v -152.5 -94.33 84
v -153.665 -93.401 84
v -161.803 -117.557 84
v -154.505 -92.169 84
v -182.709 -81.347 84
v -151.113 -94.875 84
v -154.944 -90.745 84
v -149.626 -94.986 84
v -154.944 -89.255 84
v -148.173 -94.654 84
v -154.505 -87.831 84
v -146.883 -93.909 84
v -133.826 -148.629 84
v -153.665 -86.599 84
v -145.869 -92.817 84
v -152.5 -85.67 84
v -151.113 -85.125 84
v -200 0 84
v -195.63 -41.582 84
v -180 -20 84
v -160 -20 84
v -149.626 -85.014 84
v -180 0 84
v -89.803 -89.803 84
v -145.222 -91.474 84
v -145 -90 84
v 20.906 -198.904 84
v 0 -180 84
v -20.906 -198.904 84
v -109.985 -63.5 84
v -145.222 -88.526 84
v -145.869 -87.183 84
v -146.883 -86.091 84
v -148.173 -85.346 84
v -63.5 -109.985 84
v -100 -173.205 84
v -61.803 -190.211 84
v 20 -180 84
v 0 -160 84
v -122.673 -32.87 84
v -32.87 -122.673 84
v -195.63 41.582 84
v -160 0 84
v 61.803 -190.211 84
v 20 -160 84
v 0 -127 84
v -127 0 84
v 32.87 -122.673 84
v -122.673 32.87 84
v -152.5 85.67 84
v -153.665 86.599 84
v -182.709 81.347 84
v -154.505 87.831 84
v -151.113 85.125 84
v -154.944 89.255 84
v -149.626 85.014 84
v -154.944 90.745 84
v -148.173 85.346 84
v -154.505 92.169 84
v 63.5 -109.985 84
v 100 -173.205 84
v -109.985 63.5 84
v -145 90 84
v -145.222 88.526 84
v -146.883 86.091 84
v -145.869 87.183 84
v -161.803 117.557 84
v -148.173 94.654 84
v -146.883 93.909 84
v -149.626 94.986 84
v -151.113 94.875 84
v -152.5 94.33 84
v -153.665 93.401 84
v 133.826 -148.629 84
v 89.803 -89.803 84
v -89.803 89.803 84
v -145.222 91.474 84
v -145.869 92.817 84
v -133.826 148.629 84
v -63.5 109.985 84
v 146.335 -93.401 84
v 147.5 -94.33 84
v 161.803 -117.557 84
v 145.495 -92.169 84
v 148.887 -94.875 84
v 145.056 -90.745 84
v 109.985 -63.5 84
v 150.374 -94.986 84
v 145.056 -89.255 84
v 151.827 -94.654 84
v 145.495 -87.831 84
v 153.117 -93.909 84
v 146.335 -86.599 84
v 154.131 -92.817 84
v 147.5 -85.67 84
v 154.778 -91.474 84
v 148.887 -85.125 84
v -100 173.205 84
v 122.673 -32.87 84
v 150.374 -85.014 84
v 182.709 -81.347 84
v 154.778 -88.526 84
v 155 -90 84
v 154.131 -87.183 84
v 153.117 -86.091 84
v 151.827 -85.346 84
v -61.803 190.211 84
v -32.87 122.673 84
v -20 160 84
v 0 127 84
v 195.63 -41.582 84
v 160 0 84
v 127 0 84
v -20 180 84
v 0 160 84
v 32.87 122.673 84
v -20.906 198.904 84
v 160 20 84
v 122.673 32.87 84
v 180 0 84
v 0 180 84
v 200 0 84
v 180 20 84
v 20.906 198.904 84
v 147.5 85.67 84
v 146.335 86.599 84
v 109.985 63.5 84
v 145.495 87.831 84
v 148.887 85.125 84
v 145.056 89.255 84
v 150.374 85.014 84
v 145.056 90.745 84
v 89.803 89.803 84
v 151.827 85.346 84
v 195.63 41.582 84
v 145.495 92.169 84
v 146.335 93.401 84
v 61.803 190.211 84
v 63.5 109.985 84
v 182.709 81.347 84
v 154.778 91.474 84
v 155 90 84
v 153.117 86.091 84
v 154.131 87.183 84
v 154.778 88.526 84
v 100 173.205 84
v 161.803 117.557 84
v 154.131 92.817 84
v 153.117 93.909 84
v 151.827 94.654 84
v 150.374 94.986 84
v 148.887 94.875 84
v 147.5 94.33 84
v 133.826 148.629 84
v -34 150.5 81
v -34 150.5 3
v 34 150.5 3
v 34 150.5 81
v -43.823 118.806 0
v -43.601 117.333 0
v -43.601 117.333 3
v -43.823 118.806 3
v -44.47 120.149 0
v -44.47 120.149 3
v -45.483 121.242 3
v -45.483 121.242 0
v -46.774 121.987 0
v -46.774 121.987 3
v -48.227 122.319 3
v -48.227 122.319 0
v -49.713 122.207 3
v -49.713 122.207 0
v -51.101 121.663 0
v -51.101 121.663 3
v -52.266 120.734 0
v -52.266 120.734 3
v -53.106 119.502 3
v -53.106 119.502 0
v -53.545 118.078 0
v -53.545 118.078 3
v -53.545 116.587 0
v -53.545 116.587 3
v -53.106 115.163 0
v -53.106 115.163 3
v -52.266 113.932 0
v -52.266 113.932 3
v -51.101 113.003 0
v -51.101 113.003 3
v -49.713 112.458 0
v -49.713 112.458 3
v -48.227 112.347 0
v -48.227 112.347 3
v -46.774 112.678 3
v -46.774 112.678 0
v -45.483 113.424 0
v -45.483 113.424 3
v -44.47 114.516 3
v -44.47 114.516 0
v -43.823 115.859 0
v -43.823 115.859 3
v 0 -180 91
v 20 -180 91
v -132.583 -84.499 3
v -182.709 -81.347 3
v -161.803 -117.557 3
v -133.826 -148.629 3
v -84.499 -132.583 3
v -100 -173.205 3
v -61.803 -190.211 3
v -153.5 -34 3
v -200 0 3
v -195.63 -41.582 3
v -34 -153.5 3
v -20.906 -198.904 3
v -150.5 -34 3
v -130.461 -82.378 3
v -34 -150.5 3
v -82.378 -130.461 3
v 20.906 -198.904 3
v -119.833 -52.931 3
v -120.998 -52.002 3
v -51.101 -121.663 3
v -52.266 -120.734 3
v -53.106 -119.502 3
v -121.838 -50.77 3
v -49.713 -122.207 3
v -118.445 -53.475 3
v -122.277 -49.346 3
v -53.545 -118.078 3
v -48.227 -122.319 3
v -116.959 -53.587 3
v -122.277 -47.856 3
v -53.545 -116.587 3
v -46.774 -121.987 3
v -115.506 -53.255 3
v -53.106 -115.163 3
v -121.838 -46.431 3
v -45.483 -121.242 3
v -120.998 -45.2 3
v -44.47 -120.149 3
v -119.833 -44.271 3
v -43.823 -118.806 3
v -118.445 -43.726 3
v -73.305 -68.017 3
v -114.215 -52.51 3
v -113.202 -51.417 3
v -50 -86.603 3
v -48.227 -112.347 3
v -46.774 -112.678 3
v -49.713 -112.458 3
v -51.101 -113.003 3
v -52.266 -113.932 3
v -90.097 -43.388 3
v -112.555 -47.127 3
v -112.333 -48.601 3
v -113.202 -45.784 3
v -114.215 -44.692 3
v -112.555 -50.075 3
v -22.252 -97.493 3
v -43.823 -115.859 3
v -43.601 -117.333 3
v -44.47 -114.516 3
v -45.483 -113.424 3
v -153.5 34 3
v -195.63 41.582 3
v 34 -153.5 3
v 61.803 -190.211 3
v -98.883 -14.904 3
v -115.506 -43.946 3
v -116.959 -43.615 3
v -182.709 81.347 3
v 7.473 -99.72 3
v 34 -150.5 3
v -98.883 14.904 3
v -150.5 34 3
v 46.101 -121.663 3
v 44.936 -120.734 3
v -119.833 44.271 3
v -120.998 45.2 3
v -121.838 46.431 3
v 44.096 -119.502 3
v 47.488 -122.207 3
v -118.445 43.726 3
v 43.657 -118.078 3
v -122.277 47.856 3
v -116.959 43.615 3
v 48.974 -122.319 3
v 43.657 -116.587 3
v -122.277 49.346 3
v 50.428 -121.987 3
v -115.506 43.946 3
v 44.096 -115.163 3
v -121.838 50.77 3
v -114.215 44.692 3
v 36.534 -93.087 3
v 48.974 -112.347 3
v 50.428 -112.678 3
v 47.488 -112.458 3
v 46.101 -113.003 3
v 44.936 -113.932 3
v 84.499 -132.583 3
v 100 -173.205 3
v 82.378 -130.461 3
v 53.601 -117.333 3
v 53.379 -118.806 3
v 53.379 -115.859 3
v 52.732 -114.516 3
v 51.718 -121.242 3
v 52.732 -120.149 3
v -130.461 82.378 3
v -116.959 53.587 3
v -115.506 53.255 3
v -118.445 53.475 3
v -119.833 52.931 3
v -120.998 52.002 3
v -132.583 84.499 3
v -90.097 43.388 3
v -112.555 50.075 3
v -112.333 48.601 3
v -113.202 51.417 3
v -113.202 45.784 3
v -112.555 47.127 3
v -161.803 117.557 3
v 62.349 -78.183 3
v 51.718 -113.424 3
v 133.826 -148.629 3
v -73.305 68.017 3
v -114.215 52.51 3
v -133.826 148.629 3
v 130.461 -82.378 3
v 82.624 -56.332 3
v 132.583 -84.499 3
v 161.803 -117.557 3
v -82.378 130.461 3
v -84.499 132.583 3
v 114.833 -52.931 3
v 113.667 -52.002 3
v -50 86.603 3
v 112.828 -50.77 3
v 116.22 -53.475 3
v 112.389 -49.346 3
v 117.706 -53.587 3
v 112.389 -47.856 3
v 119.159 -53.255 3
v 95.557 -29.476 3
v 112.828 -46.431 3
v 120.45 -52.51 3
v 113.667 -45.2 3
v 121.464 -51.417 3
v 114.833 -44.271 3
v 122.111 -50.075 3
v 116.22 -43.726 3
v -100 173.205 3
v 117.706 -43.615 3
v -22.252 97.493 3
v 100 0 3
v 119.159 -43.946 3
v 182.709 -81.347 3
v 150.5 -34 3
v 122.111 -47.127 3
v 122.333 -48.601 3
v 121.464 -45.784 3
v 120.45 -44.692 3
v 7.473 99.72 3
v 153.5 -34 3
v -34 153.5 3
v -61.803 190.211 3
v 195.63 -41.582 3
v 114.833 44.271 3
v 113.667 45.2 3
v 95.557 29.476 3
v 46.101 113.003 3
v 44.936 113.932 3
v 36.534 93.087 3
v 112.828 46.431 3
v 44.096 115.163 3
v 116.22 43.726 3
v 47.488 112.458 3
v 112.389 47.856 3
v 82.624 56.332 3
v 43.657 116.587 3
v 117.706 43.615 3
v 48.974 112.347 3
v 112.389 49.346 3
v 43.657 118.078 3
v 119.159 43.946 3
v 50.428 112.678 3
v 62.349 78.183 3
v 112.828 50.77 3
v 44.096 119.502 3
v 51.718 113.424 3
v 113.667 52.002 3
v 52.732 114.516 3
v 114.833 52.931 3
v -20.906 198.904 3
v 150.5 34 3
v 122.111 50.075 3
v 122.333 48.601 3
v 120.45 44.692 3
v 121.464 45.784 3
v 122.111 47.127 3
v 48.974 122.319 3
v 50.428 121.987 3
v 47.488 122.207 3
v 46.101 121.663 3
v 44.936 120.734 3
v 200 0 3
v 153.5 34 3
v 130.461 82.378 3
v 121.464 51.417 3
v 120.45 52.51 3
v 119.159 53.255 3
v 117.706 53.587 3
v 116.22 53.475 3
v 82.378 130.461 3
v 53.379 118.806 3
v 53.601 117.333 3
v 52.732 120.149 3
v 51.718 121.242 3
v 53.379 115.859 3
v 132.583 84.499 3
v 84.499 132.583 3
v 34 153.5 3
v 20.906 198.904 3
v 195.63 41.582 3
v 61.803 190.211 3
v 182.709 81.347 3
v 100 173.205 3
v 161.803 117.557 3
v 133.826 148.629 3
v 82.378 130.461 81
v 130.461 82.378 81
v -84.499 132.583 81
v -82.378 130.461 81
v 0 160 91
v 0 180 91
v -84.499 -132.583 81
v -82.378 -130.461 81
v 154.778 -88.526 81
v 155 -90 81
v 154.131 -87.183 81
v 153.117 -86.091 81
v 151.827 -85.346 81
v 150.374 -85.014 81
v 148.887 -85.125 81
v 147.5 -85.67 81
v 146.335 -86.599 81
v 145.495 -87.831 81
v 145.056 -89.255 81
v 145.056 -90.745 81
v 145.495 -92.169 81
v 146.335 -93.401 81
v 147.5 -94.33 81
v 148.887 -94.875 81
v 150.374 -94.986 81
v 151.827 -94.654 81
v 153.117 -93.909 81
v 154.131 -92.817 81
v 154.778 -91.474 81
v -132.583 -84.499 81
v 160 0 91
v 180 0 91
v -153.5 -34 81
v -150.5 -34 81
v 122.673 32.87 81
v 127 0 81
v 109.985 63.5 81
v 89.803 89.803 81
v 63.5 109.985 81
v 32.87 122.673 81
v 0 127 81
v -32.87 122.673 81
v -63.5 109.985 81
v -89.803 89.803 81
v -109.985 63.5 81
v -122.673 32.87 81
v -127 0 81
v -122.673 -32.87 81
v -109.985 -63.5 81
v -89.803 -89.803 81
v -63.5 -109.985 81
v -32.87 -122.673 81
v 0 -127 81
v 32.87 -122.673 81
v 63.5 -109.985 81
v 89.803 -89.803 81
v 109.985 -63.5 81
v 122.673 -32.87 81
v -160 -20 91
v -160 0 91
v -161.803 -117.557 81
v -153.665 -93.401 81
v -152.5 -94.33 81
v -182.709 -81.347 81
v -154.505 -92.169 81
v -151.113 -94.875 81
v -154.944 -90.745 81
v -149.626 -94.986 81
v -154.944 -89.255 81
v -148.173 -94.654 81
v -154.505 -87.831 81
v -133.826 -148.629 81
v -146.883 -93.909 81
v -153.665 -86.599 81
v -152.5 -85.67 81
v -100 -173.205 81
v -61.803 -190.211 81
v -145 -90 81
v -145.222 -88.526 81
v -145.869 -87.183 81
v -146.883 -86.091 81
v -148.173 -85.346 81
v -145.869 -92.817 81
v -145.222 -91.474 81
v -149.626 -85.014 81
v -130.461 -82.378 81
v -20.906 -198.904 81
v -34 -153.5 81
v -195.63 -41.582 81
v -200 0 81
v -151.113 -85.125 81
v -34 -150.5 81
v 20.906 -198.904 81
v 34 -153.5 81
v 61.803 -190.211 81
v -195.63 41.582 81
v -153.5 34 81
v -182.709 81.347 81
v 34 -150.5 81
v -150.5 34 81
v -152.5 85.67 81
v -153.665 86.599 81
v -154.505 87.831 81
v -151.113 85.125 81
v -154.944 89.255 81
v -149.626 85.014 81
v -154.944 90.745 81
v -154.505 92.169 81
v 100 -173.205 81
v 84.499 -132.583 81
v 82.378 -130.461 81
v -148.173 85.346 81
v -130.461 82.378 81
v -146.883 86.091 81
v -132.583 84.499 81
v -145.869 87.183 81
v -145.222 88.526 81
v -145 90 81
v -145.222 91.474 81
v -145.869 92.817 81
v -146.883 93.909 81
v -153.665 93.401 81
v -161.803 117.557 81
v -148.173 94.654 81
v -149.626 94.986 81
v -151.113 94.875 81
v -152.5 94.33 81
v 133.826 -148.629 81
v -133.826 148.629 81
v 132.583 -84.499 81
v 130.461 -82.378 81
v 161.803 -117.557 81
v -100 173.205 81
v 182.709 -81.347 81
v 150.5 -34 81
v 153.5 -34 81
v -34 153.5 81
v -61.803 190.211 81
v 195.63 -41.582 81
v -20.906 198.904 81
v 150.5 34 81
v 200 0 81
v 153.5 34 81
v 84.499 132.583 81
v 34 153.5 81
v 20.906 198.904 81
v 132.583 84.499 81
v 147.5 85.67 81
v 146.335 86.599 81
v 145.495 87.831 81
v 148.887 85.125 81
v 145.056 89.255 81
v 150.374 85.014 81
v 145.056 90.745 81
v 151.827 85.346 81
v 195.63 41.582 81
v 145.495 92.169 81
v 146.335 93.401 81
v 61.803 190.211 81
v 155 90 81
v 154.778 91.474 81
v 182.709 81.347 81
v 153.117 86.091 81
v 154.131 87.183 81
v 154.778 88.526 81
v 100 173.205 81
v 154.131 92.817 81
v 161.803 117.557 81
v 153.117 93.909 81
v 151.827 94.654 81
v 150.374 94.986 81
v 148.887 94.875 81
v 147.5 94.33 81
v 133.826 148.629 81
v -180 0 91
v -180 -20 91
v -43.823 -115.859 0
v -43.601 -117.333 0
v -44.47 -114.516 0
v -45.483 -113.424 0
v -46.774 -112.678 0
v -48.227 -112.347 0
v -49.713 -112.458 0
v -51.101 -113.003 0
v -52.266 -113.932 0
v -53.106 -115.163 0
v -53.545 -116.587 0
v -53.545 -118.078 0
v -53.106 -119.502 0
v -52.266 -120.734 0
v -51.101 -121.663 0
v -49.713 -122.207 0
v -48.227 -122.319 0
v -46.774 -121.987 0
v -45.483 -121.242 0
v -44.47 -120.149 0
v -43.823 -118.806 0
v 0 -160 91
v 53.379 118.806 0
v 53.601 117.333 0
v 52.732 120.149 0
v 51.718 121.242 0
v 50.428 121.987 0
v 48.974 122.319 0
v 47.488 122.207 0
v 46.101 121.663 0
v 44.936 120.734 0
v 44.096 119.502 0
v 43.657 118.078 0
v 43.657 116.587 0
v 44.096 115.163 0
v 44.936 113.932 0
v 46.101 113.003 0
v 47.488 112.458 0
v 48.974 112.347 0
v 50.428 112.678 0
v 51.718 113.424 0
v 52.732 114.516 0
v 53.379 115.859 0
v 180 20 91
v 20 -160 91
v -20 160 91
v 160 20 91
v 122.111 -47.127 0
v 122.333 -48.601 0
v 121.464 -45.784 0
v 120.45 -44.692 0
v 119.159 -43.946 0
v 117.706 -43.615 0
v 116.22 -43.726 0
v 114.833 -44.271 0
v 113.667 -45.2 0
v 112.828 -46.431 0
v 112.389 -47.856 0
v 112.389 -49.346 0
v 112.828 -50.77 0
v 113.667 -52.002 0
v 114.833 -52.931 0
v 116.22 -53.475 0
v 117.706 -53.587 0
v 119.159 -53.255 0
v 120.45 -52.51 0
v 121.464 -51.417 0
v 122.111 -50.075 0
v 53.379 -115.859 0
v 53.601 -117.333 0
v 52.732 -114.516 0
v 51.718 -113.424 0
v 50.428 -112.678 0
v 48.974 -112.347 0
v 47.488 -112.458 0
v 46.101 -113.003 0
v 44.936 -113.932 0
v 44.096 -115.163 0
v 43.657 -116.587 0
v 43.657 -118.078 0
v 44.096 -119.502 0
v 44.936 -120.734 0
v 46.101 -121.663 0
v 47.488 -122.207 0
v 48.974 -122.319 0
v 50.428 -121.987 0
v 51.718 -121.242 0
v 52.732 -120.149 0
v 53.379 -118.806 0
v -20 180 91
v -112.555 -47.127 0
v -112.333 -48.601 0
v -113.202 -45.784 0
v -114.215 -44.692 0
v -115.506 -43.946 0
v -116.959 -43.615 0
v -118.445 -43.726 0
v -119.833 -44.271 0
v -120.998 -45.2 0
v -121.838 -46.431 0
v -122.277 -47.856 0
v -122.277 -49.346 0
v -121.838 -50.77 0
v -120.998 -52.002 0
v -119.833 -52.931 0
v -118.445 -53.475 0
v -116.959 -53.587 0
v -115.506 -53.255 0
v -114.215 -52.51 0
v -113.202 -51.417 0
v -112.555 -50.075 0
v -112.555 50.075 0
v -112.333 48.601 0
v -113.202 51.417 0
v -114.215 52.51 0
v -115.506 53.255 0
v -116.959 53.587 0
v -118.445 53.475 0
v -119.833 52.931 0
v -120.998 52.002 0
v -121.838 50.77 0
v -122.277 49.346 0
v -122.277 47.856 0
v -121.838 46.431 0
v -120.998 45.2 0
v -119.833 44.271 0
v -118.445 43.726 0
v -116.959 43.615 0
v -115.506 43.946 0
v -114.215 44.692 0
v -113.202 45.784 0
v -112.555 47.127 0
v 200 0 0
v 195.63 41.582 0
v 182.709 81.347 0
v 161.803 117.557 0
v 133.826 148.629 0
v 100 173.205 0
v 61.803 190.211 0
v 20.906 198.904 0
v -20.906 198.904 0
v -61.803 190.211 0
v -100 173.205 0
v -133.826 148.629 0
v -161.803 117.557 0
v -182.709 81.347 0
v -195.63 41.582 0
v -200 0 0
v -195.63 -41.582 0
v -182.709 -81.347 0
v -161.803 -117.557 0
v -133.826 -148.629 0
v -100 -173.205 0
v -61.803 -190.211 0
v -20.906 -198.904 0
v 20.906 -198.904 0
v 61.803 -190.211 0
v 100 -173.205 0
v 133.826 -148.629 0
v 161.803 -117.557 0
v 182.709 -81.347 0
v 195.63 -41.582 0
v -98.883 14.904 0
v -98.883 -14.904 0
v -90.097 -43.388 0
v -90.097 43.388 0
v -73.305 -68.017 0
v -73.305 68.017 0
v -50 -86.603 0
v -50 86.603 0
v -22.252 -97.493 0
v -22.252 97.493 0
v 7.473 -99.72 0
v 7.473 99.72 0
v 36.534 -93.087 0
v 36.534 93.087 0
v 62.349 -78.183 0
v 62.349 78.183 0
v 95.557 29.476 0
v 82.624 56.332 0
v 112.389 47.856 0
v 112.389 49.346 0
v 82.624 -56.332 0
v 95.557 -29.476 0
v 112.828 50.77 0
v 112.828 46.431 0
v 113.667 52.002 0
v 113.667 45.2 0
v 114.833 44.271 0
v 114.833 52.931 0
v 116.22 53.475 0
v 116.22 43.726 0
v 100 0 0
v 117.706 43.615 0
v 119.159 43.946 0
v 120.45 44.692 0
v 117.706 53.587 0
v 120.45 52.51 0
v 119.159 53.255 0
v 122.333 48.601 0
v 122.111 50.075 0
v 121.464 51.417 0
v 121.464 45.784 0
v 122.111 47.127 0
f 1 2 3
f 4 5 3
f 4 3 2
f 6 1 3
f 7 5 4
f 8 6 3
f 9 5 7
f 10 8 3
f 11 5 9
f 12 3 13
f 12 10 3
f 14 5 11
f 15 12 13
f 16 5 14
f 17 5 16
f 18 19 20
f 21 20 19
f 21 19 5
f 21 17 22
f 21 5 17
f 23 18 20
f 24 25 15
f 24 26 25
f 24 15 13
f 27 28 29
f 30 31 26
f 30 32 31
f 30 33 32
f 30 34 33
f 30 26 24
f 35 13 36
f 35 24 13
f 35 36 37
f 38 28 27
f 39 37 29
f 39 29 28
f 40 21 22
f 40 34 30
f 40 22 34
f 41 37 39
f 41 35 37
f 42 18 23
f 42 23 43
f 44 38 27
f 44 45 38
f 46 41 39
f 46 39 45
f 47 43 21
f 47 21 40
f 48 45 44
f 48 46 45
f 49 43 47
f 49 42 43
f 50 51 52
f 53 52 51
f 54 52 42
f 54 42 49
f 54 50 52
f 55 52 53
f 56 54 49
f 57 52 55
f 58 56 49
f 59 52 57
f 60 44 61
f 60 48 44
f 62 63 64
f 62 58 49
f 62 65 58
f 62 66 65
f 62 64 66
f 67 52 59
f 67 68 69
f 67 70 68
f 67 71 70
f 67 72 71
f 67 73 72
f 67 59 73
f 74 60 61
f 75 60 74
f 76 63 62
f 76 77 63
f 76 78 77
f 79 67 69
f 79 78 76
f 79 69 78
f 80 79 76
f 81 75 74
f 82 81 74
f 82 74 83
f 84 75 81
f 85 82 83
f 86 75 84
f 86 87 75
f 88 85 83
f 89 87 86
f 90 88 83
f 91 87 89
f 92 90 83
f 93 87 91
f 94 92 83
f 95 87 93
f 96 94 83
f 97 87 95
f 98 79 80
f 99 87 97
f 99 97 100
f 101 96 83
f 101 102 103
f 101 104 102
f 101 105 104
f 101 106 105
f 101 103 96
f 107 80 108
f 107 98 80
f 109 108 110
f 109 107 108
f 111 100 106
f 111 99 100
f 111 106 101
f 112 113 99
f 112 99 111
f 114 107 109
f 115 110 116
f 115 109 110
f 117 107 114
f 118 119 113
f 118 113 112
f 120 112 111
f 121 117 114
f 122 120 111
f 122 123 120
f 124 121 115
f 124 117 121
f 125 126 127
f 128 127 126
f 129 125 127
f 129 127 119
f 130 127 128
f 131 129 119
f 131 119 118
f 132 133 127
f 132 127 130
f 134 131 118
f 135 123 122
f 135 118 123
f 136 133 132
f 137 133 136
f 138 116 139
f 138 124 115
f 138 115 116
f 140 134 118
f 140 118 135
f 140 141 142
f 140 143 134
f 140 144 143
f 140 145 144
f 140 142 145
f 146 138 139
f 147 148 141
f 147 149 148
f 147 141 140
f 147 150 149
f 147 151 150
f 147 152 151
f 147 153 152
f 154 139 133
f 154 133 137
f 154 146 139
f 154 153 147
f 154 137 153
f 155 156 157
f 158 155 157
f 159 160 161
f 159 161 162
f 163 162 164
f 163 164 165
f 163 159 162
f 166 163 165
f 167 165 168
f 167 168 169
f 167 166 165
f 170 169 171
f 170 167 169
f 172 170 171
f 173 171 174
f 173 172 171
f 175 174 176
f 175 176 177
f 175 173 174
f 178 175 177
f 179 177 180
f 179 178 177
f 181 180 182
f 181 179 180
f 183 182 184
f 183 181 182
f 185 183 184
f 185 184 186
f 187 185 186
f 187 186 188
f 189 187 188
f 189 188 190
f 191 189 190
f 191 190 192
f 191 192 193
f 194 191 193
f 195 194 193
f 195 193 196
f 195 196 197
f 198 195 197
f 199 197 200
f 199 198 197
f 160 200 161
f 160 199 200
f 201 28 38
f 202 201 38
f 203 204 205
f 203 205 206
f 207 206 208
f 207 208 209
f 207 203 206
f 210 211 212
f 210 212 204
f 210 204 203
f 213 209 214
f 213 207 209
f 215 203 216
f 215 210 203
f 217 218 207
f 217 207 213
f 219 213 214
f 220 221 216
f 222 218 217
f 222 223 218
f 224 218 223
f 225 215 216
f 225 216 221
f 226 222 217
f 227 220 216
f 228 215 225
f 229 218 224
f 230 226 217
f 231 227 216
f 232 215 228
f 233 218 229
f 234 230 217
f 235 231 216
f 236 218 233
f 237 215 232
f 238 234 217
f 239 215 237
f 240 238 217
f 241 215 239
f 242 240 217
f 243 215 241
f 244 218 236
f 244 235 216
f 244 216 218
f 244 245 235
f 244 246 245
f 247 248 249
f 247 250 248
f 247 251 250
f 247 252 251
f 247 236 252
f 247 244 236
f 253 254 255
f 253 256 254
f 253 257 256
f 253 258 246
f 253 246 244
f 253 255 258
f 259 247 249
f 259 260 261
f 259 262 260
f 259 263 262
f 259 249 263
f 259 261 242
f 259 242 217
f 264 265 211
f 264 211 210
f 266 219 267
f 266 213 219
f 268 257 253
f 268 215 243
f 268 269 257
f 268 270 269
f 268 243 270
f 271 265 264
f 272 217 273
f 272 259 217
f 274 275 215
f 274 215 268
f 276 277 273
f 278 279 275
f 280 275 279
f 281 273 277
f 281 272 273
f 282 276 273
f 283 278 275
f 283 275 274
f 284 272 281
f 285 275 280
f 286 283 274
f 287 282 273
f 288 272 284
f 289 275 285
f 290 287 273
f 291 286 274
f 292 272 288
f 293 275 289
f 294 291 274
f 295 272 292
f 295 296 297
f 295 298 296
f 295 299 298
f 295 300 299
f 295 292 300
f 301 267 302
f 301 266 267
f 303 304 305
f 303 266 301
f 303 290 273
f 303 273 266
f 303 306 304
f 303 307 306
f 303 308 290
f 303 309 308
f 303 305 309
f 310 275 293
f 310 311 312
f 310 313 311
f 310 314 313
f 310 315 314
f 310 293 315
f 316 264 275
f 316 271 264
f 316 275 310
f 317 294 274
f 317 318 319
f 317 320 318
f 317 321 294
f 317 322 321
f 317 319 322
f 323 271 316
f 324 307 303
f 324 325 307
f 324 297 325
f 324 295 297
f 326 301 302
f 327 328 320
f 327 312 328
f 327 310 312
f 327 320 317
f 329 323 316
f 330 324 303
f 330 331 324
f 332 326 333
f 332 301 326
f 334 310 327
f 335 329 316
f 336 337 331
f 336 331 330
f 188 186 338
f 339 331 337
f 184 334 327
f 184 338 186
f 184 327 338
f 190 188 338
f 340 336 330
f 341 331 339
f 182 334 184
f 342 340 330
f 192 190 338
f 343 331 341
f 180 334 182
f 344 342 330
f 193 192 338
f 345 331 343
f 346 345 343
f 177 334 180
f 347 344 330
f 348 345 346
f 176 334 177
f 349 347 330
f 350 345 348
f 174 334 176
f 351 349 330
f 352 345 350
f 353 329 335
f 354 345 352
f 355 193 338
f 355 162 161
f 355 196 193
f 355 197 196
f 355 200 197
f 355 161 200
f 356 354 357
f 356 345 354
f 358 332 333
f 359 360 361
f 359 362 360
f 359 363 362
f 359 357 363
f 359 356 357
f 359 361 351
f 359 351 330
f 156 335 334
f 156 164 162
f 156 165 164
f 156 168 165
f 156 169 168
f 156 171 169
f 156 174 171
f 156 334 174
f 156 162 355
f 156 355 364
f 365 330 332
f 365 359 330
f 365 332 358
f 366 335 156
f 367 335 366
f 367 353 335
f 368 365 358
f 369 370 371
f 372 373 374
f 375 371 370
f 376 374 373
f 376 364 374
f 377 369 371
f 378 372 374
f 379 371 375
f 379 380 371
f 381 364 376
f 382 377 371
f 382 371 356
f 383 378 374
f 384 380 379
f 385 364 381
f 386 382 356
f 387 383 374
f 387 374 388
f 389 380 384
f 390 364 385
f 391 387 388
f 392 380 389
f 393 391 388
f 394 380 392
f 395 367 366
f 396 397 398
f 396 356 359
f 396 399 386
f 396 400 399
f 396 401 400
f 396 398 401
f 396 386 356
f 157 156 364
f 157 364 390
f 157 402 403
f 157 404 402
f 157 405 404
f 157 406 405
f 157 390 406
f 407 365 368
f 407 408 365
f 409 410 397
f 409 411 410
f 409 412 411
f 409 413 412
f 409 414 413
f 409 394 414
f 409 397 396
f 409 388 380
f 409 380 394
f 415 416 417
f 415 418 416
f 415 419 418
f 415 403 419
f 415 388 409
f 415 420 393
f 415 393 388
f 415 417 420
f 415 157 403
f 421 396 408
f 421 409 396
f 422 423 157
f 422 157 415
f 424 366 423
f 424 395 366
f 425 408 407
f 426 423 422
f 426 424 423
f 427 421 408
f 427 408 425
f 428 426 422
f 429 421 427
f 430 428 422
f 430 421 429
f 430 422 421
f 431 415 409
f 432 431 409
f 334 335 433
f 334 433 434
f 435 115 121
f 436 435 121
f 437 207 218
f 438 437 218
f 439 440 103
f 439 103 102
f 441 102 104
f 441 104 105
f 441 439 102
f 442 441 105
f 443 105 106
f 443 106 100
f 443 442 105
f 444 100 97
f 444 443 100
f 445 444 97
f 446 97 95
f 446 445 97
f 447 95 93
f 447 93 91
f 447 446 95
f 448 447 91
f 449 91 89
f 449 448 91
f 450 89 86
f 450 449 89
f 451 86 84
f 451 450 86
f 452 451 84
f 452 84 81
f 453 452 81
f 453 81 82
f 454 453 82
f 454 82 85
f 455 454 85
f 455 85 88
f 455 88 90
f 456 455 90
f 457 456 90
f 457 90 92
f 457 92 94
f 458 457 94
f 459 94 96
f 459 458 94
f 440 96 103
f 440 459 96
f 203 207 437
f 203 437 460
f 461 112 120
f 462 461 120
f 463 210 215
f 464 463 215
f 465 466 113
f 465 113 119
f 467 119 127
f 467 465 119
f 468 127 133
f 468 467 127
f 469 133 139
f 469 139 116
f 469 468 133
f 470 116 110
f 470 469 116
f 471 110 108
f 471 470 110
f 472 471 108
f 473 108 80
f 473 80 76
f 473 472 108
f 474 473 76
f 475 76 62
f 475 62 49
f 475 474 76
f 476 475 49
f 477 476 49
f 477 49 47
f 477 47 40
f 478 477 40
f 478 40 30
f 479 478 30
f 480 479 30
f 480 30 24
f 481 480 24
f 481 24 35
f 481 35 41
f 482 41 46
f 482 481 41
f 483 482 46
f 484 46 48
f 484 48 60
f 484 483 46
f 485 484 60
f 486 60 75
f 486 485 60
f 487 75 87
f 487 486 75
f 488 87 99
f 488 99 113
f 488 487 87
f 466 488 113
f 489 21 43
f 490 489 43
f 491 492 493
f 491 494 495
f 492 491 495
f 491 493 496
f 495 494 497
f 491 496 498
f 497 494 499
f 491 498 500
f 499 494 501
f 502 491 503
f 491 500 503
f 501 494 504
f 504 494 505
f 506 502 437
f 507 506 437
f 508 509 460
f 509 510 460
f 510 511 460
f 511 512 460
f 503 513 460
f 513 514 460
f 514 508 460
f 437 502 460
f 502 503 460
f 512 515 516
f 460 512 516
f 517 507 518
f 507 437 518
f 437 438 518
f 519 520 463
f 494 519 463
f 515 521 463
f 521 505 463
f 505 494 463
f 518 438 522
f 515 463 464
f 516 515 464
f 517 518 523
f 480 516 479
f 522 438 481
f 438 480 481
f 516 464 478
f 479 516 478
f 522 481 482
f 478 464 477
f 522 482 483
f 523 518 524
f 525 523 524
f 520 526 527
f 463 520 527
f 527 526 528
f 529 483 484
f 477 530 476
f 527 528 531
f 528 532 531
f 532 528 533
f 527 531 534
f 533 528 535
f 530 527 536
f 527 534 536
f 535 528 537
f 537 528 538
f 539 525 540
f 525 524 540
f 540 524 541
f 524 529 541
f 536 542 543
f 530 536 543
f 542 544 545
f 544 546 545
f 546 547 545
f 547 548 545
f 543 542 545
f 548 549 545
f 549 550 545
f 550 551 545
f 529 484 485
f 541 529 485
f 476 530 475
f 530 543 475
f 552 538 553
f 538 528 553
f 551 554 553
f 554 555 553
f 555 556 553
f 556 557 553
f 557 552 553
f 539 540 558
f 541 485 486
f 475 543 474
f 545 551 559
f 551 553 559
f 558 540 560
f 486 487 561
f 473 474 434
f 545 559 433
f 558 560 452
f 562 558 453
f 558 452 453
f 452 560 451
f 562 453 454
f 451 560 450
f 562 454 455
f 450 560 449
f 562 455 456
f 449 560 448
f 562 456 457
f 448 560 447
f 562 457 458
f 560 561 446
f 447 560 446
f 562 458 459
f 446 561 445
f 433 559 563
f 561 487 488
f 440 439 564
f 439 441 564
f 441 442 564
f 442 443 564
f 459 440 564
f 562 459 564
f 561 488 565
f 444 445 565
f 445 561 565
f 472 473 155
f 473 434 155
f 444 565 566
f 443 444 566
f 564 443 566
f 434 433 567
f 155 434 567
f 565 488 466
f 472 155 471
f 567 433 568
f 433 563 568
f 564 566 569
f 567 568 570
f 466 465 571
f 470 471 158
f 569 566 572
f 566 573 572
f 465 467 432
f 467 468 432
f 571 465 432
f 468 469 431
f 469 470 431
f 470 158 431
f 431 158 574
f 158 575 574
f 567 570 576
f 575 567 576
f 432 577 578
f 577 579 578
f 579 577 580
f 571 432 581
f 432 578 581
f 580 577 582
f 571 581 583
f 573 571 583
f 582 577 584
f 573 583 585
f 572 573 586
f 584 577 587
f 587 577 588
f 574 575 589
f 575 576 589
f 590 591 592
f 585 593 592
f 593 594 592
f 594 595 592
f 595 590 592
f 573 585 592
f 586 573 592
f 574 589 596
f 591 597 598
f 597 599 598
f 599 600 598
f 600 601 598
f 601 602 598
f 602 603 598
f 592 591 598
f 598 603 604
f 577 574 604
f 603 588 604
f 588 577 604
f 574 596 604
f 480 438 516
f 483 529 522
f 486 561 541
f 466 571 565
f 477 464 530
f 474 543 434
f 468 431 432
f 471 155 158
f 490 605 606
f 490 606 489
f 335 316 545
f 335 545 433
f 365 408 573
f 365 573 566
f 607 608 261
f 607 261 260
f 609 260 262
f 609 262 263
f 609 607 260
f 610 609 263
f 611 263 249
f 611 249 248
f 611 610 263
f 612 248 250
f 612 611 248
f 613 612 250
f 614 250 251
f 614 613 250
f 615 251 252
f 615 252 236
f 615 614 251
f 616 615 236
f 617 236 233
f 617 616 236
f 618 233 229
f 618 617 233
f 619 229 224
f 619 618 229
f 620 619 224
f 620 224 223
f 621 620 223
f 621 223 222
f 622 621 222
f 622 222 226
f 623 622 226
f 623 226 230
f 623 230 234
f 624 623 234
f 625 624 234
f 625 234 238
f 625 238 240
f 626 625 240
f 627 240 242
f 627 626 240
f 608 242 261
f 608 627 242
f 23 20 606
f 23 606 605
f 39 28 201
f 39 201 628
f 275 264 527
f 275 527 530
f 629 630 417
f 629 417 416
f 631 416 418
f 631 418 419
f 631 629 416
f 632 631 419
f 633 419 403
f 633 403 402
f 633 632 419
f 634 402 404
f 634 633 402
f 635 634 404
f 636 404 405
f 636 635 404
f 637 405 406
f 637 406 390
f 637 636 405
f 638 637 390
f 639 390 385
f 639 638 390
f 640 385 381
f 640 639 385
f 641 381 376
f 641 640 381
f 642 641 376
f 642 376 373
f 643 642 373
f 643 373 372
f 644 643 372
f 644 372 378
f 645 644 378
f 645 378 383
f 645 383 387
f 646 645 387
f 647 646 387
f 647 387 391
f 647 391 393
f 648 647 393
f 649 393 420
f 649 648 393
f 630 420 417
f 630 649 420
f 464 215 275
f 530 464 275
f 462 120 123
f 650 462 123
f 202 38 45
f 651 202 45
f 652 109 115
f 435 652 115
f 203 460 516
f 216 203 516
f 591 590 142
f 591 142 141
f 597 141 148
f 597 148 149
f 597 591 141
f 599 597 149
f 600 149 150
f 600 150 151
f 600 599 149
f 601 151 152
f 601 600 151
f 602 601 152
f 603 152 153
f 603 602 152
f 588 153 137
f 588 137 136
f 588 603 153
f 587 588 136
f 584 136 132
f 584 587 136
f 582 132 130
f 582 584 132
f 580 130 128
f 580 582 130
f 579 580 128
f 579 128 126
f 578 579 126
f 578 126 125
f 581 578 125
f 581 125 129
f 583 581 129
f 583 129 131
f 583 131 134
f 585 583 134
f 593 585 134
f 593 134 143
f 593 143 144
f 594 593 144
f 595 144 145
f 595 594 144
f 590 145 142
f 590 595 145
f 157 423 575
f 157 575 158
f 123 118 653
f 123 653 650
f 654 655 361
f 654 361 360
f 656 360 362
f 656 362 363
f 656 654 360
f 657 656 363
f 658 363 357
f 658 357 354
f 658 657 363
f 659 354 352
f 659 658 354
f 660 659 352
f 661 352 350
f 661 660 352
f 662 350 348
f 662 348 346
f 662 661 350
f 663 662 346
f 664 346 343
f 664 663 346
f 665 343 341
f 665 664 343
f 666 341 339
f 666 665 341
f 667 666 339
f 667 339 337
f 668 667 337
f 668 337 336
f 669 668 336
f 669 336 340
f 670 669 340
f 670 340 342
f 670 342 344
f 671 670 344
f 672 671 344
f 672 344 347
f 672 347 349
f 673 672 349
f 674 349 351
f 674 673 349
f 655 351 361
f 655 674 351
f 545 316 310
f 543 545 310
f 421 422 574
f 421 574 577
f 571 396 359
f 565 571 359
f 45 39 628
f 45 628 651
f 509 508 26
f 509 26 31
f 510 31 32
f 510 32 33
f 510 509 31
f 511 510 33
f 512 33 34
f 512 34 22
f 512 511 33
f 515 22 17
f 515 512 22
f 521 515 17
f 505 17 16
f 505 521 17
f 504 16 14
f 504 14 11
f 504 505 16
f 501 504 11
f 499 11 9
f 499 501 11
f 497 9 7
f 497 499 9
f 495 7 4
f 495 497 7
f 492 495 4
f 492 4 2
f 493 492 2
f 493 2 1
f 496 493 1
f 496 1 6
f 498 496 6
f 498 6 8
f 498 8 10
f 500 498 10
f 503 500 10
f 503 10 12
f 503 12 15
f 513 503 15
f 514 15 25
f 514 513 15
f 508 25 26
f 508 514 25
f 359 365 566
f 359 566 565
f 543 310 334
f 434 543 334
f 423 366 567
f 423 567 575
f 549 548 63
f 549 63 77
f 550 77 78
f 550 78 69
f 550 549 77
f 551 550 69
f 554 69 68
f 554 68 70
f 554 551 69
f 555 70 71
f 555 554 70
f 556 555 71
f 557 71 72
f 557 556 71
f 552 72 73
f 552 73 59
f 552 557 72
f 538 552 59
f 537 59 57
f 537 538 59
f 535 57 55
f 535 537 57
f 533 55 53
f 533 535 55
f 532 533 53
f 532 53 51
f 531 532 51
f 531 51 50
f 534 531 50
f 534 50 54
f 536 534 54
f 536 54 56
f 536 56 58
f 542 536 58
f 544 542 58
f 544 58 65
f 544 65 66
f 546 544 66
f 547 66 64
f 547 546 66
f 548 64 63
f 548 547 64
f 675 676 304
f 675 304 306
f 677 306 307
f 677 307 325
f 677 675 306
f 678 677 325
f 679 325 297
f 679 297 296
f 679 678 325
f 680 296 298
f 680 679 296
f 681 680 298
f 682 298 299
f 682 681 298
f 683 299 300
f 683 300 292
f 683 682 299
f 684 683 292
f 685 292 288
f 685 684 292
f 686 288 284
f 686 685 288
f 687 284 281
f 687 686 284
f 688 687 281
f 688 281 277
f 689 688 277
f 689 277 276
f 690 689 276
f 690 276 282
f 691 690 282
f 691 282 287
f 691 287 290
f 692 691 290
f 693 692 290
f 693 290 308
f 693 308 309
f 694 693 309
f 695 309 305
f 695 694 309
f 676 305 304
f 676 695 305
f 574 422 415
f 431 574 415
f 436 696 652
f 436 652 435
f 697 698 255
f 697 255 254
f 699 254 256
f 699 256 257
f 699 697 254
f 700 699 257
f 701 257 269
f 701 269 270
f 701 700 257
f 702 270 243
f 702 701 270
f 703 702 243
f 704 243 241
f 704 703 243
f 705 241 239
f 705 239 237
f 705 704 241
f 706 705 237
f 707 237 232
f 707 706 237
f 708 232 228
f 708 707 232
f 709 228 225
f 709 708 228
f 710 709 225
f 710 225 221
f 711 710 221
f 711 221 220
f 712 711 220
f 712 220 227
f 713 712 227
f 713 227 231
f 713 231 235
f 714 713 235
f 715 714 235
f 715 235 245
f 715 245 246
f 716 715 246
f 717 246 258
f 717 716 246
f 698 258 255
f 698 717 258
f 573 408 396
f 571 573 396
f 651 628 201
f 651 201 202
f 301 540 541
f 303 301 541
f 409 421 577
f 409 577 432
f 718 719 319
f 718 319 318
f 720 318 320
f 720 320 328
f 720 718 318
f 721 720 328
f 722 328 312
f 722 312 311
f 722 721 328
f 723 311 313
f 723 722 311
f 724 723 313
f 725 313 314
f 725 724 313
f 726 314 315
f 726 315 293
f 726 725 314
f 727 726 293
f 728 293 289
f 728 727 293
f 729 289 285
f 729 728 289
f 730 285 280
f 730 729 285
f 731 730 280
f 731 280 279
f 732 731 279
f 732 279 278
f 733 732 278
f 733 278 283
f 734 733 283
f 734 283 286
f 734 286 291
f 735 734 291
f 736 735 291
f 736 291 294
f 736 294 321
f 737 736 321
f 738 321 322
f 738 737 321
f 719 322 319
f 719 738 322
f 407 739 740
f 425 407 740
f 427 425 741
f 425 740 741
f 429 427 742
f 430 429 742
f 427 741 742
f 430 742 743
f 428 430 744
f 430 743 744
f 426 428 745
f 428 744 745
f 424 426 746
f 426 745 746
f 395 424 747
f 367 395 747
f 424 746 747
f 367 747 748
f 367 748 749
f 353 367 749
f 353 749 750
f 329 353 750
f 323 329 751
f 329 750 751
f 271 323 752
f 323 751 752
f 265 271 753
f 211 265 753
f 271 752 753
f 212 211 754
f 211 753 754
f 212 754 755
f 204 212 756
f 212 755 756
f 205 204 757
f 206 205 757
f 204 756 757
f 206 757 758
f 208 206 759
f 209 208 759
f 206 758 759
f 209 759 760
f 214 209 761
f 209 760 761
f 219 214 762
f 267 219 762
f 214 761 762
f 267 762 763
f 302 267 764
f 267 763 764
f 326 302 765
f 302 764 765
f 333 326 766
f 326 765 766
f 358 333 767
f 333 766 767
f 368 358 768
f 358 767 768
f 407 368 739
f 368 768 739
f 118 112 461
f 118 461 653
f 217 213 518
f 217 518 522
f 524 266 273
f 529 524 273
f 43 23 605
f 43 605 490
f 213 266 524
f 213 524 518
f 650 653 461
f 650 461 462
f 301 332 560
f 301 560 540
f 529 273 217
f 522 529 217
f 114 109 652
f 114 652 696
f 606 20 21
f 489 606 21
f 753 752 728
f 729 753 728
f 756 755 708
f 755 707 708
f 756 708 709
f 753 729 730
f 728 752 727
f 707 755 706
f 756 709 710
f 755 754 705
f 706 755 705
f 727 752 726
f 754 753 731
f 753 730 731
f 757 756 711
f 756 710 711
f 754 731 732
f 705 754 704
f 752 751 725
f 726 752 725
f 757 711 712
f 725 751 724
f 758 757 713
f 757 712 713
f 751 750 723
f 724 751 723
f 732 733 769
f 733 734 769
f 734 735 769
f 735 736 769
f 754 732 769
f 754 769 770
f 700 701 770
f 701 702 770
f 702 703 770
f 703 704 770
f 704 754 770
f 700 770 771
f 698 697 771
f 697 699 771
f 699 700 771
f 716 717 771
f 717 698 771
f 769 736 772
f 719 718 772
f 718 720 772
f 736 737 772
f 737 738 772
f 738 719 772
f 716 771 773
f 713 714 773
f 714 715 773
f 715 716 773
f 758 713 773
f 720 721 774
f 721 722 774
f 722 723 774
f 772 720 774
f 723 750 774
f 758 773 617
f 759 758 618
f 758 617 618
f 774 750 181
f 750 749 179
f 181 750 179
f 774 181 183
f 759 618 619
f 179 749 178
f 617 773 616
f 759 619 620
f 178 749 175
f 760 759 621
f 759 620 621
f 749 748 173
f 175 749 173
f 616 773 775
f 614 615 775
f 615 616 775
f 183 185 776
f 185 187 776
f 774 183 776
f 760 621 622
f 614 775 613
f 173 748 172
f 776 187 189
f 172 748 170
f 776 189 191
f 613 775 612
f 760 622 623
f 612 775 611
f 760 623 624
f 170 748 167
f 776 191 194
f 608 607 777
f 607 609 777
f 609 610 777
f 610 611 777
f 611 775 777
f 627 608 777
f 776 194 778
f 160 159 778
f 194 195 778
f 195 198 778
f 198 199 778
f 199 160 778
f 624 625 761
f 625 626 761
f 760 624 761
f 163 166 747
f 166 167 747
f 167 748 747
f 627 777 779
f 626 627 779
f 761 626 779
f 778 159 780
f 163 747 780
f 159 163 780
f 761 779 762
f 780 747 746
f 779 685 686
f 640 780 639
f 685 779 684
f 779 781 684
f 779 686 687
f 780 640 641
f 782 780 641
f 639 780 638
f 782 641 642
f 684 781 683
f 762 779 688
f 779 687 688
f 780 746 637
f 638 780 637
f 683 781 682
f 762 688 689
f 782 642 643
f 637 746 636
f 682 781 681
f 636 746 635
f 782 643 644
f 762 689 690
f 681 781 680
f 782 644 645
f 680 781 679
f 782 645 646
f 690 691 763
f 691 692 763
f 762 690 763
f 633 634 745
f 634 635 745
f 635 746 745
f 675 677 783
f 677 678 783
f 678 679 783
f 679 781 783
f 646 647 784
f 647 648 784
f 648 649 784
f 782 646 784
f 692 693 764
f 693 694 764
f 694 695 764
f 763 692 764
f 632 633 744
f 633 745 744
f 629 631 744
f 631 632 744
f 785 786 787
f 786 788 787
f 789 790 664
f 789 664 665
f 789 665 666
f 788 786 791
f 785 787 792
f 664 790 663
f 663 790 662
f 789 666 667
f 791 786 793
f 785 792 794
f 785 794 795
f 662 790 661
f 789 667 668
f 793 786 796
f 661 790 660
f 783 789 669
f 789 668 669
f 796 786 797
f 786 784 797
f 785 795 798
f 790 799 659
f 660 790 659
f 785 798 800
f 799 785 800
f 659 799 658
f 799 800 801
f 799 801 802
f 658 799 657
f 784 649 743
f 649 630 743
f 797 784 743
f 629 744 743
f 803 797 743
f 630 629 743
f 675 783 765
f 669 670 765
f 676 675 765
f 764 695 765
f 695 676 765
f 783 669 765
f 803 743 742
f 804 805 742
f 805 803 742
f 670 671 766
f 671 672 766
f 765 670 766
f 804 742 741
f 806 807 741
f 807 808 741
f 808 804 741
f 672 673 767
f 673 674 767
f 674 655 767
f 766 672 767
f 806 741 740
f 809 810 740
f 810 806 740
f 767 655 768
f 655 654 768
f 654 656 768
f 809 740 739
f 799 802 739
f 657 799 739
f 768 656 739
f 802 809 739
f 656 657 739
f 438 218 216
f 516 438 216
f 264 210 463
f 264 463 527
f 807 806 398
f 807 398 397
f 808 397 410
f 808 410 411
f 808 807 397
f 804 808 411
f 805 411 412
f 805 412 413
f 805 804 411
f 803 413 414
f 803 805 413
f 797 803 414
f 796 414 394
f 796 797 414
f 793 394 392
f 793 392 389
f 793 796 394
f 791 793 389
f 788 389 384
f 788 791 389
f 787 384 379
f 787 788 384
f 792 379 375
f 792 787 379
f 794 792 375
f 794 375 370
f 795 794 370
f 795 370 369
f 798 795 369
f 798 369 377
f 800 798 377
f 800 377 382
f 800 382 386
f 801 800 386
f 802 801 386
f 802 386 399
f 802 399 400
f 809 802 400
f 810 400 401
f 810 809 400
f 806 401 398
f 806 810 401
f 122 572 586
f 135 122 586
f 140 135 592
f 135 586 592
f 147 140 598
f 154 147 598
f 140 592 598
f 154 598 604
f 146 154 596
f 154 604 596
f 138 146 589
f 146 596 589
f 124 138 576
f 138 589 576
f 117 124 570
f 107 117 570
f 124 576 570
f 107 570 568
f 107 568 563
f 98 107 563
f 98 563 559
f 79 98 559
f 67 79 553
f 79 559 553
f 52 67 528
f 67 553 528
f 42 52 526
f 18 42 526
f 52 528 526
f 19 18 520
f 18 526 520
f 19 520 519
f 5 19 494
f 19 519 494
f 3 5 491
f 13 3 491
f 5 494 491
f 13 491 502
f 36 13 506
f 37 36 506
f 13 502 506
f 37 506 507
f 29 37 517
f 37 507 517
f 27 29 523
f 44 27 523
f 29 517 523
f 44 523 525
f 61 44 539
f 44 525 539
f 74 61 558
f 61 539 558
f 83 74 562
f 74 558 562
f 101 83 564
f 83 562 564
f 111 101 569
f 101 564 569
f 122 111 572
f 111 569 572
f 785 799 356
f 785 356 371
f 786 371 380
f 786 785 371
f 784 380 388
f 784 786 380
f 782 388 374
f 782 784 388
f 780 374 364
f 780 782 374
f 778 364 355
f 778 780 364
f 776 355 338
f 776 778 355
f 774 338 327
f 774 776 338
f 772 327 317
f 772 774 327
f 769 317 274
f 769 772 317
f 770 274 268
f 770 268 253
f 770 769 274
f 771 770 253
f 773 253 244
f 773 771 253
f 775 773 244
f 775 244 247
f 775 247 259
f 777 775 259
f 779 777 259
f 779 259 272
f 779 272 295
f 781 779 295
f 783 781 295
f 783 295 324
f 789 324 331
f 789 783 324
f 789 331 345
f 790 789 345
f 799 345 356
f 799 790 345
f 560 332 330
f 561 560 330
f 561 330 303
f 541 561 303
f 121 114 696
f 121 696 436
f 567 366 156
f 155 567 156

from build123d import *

# Parameters (mm, degrees)
SKETCH_R           = 200
SKETCH_R_2         = 100
SKETCH_R_3         = 5
PAD_DEPTH          = 3
SKETCH001_W        = 3
SKETCH001_H        = 68
PAD001_DEPTH       = 84
SKETCH002_R        = 200
SKETCH002_R_2      = 127
SKETCH002_R_3      = 5
PAD002_DEPTH       = 3
POLARPATTERN_COUNT = 8
SKETCH003_W        = 20
SKETCH003_H        = 20
PAD003_DEPTH       = 10


with BuildPart() as part:
    # Sketch → Pad (new body)
    with BuildSketch(Plane.XY):
        Circle(SKETCH_R)
        Circle(SKETCH_R_2, mode=Mode.SUBTRACT)
        with Locations((-117.332701, 48.600796)):
            Circle(SKETCH_R_3, mode=Mode.SUBTRACT)
        with Locations((-48.600796, 117.332701)):
            Circle(SKETCH_R_3, mode=Mode.SUBTRACT)
        with Locations((48.600796, 117.332701)):
            Circle(SKETCH_R_3, mode=Mode.SUBTRACT)
        with Locations((117.332701, 48.600796)):
            Circle(SKETCH_R_3, mode=Mode.SUBTRACT)
        with Locations((117.332701, -48.600796)):
            Circle(SKETCH_R_3, mode=Mode.SUBTRACT)
        with Locations((48.600796, -117.332701)):
            Circle(SKETCH_R_3, mode=Mode.SUBTRACT)
        with Locations((-48.600796, -117.332701)):
            Circle(SKETCH_R_3, mode=Mode.SUBTRACT)
        with Locations((-117.332701, -48.600796)):
            Circle(SKETCH_R_3, mode=Mode.SUBTRACT)
    extrude(amount=PAD_DEPTH)

    # Sketch001 → Pad001 (join)
    with BuildSketch(Plane.XY):
        with Locations((-152, 0)):
            Rectangle(SKETCH001_W, SKETCH001_H)
    pad001 = extrude(amount=PAD001_DEPTH)

    # Sketch002 (on DatumPlane) → Pad002 (join)
    with BuildSketch(Plane.XY.offset(81)):
        Circle(SKETCH002_R)
        Circle(SKETCH002_R_2, mode=Mode.SUBTRACT)
        with Locations((-150, 90)):
            Circle(SKETCH002_R_3, mode=Mode.SUBTRACT)
        with Locations((-150, -90)):
            Circle(SKETCH002_R_3, mode=Mode.SUBTRACT)
        with Locations((150, 90)):
            Circle(SKETCH002_R_3, mode=Mode.SUBTRACT)
        with Locations((150, -90)):
            Circle(SKETCH002_R_3, mode=Mode.SUBTRACT)
    extrude(amount=PAD002_DEPTH)

    # PolarPattern: Pad001 ×8 about axis
    polarpattern_axis = Axis((0, 0, 0), (0, 0, 1))
    for i in range(1, POLARPATTERN_COUNT):
        add(pad001.rotate(polarpattern_axis, i * 360 / POLARPATTERN_COUNT))

    # Sketch003 (on DatumPlane) → Pad003 (join)
    with BuildSketch(Plane.XY.offset(81)):
        with Locations((170, 10)):
            Rectangle(SKETCH003_W, SKETCH003_H)
        with Locations((-10, 170)):
            Rectangle(SKETCH003_W, SKETCH003_H)
        with Locations((-170, -10)):
            Rectangle(SKETCH003_W, SKETCH003_H)
        with Locations((10, -170)):
            Rectangle(SKETCH003_W, SKETCH003_H)
    extrude(amount=PAD003_DEPTH)


solid = part.part
